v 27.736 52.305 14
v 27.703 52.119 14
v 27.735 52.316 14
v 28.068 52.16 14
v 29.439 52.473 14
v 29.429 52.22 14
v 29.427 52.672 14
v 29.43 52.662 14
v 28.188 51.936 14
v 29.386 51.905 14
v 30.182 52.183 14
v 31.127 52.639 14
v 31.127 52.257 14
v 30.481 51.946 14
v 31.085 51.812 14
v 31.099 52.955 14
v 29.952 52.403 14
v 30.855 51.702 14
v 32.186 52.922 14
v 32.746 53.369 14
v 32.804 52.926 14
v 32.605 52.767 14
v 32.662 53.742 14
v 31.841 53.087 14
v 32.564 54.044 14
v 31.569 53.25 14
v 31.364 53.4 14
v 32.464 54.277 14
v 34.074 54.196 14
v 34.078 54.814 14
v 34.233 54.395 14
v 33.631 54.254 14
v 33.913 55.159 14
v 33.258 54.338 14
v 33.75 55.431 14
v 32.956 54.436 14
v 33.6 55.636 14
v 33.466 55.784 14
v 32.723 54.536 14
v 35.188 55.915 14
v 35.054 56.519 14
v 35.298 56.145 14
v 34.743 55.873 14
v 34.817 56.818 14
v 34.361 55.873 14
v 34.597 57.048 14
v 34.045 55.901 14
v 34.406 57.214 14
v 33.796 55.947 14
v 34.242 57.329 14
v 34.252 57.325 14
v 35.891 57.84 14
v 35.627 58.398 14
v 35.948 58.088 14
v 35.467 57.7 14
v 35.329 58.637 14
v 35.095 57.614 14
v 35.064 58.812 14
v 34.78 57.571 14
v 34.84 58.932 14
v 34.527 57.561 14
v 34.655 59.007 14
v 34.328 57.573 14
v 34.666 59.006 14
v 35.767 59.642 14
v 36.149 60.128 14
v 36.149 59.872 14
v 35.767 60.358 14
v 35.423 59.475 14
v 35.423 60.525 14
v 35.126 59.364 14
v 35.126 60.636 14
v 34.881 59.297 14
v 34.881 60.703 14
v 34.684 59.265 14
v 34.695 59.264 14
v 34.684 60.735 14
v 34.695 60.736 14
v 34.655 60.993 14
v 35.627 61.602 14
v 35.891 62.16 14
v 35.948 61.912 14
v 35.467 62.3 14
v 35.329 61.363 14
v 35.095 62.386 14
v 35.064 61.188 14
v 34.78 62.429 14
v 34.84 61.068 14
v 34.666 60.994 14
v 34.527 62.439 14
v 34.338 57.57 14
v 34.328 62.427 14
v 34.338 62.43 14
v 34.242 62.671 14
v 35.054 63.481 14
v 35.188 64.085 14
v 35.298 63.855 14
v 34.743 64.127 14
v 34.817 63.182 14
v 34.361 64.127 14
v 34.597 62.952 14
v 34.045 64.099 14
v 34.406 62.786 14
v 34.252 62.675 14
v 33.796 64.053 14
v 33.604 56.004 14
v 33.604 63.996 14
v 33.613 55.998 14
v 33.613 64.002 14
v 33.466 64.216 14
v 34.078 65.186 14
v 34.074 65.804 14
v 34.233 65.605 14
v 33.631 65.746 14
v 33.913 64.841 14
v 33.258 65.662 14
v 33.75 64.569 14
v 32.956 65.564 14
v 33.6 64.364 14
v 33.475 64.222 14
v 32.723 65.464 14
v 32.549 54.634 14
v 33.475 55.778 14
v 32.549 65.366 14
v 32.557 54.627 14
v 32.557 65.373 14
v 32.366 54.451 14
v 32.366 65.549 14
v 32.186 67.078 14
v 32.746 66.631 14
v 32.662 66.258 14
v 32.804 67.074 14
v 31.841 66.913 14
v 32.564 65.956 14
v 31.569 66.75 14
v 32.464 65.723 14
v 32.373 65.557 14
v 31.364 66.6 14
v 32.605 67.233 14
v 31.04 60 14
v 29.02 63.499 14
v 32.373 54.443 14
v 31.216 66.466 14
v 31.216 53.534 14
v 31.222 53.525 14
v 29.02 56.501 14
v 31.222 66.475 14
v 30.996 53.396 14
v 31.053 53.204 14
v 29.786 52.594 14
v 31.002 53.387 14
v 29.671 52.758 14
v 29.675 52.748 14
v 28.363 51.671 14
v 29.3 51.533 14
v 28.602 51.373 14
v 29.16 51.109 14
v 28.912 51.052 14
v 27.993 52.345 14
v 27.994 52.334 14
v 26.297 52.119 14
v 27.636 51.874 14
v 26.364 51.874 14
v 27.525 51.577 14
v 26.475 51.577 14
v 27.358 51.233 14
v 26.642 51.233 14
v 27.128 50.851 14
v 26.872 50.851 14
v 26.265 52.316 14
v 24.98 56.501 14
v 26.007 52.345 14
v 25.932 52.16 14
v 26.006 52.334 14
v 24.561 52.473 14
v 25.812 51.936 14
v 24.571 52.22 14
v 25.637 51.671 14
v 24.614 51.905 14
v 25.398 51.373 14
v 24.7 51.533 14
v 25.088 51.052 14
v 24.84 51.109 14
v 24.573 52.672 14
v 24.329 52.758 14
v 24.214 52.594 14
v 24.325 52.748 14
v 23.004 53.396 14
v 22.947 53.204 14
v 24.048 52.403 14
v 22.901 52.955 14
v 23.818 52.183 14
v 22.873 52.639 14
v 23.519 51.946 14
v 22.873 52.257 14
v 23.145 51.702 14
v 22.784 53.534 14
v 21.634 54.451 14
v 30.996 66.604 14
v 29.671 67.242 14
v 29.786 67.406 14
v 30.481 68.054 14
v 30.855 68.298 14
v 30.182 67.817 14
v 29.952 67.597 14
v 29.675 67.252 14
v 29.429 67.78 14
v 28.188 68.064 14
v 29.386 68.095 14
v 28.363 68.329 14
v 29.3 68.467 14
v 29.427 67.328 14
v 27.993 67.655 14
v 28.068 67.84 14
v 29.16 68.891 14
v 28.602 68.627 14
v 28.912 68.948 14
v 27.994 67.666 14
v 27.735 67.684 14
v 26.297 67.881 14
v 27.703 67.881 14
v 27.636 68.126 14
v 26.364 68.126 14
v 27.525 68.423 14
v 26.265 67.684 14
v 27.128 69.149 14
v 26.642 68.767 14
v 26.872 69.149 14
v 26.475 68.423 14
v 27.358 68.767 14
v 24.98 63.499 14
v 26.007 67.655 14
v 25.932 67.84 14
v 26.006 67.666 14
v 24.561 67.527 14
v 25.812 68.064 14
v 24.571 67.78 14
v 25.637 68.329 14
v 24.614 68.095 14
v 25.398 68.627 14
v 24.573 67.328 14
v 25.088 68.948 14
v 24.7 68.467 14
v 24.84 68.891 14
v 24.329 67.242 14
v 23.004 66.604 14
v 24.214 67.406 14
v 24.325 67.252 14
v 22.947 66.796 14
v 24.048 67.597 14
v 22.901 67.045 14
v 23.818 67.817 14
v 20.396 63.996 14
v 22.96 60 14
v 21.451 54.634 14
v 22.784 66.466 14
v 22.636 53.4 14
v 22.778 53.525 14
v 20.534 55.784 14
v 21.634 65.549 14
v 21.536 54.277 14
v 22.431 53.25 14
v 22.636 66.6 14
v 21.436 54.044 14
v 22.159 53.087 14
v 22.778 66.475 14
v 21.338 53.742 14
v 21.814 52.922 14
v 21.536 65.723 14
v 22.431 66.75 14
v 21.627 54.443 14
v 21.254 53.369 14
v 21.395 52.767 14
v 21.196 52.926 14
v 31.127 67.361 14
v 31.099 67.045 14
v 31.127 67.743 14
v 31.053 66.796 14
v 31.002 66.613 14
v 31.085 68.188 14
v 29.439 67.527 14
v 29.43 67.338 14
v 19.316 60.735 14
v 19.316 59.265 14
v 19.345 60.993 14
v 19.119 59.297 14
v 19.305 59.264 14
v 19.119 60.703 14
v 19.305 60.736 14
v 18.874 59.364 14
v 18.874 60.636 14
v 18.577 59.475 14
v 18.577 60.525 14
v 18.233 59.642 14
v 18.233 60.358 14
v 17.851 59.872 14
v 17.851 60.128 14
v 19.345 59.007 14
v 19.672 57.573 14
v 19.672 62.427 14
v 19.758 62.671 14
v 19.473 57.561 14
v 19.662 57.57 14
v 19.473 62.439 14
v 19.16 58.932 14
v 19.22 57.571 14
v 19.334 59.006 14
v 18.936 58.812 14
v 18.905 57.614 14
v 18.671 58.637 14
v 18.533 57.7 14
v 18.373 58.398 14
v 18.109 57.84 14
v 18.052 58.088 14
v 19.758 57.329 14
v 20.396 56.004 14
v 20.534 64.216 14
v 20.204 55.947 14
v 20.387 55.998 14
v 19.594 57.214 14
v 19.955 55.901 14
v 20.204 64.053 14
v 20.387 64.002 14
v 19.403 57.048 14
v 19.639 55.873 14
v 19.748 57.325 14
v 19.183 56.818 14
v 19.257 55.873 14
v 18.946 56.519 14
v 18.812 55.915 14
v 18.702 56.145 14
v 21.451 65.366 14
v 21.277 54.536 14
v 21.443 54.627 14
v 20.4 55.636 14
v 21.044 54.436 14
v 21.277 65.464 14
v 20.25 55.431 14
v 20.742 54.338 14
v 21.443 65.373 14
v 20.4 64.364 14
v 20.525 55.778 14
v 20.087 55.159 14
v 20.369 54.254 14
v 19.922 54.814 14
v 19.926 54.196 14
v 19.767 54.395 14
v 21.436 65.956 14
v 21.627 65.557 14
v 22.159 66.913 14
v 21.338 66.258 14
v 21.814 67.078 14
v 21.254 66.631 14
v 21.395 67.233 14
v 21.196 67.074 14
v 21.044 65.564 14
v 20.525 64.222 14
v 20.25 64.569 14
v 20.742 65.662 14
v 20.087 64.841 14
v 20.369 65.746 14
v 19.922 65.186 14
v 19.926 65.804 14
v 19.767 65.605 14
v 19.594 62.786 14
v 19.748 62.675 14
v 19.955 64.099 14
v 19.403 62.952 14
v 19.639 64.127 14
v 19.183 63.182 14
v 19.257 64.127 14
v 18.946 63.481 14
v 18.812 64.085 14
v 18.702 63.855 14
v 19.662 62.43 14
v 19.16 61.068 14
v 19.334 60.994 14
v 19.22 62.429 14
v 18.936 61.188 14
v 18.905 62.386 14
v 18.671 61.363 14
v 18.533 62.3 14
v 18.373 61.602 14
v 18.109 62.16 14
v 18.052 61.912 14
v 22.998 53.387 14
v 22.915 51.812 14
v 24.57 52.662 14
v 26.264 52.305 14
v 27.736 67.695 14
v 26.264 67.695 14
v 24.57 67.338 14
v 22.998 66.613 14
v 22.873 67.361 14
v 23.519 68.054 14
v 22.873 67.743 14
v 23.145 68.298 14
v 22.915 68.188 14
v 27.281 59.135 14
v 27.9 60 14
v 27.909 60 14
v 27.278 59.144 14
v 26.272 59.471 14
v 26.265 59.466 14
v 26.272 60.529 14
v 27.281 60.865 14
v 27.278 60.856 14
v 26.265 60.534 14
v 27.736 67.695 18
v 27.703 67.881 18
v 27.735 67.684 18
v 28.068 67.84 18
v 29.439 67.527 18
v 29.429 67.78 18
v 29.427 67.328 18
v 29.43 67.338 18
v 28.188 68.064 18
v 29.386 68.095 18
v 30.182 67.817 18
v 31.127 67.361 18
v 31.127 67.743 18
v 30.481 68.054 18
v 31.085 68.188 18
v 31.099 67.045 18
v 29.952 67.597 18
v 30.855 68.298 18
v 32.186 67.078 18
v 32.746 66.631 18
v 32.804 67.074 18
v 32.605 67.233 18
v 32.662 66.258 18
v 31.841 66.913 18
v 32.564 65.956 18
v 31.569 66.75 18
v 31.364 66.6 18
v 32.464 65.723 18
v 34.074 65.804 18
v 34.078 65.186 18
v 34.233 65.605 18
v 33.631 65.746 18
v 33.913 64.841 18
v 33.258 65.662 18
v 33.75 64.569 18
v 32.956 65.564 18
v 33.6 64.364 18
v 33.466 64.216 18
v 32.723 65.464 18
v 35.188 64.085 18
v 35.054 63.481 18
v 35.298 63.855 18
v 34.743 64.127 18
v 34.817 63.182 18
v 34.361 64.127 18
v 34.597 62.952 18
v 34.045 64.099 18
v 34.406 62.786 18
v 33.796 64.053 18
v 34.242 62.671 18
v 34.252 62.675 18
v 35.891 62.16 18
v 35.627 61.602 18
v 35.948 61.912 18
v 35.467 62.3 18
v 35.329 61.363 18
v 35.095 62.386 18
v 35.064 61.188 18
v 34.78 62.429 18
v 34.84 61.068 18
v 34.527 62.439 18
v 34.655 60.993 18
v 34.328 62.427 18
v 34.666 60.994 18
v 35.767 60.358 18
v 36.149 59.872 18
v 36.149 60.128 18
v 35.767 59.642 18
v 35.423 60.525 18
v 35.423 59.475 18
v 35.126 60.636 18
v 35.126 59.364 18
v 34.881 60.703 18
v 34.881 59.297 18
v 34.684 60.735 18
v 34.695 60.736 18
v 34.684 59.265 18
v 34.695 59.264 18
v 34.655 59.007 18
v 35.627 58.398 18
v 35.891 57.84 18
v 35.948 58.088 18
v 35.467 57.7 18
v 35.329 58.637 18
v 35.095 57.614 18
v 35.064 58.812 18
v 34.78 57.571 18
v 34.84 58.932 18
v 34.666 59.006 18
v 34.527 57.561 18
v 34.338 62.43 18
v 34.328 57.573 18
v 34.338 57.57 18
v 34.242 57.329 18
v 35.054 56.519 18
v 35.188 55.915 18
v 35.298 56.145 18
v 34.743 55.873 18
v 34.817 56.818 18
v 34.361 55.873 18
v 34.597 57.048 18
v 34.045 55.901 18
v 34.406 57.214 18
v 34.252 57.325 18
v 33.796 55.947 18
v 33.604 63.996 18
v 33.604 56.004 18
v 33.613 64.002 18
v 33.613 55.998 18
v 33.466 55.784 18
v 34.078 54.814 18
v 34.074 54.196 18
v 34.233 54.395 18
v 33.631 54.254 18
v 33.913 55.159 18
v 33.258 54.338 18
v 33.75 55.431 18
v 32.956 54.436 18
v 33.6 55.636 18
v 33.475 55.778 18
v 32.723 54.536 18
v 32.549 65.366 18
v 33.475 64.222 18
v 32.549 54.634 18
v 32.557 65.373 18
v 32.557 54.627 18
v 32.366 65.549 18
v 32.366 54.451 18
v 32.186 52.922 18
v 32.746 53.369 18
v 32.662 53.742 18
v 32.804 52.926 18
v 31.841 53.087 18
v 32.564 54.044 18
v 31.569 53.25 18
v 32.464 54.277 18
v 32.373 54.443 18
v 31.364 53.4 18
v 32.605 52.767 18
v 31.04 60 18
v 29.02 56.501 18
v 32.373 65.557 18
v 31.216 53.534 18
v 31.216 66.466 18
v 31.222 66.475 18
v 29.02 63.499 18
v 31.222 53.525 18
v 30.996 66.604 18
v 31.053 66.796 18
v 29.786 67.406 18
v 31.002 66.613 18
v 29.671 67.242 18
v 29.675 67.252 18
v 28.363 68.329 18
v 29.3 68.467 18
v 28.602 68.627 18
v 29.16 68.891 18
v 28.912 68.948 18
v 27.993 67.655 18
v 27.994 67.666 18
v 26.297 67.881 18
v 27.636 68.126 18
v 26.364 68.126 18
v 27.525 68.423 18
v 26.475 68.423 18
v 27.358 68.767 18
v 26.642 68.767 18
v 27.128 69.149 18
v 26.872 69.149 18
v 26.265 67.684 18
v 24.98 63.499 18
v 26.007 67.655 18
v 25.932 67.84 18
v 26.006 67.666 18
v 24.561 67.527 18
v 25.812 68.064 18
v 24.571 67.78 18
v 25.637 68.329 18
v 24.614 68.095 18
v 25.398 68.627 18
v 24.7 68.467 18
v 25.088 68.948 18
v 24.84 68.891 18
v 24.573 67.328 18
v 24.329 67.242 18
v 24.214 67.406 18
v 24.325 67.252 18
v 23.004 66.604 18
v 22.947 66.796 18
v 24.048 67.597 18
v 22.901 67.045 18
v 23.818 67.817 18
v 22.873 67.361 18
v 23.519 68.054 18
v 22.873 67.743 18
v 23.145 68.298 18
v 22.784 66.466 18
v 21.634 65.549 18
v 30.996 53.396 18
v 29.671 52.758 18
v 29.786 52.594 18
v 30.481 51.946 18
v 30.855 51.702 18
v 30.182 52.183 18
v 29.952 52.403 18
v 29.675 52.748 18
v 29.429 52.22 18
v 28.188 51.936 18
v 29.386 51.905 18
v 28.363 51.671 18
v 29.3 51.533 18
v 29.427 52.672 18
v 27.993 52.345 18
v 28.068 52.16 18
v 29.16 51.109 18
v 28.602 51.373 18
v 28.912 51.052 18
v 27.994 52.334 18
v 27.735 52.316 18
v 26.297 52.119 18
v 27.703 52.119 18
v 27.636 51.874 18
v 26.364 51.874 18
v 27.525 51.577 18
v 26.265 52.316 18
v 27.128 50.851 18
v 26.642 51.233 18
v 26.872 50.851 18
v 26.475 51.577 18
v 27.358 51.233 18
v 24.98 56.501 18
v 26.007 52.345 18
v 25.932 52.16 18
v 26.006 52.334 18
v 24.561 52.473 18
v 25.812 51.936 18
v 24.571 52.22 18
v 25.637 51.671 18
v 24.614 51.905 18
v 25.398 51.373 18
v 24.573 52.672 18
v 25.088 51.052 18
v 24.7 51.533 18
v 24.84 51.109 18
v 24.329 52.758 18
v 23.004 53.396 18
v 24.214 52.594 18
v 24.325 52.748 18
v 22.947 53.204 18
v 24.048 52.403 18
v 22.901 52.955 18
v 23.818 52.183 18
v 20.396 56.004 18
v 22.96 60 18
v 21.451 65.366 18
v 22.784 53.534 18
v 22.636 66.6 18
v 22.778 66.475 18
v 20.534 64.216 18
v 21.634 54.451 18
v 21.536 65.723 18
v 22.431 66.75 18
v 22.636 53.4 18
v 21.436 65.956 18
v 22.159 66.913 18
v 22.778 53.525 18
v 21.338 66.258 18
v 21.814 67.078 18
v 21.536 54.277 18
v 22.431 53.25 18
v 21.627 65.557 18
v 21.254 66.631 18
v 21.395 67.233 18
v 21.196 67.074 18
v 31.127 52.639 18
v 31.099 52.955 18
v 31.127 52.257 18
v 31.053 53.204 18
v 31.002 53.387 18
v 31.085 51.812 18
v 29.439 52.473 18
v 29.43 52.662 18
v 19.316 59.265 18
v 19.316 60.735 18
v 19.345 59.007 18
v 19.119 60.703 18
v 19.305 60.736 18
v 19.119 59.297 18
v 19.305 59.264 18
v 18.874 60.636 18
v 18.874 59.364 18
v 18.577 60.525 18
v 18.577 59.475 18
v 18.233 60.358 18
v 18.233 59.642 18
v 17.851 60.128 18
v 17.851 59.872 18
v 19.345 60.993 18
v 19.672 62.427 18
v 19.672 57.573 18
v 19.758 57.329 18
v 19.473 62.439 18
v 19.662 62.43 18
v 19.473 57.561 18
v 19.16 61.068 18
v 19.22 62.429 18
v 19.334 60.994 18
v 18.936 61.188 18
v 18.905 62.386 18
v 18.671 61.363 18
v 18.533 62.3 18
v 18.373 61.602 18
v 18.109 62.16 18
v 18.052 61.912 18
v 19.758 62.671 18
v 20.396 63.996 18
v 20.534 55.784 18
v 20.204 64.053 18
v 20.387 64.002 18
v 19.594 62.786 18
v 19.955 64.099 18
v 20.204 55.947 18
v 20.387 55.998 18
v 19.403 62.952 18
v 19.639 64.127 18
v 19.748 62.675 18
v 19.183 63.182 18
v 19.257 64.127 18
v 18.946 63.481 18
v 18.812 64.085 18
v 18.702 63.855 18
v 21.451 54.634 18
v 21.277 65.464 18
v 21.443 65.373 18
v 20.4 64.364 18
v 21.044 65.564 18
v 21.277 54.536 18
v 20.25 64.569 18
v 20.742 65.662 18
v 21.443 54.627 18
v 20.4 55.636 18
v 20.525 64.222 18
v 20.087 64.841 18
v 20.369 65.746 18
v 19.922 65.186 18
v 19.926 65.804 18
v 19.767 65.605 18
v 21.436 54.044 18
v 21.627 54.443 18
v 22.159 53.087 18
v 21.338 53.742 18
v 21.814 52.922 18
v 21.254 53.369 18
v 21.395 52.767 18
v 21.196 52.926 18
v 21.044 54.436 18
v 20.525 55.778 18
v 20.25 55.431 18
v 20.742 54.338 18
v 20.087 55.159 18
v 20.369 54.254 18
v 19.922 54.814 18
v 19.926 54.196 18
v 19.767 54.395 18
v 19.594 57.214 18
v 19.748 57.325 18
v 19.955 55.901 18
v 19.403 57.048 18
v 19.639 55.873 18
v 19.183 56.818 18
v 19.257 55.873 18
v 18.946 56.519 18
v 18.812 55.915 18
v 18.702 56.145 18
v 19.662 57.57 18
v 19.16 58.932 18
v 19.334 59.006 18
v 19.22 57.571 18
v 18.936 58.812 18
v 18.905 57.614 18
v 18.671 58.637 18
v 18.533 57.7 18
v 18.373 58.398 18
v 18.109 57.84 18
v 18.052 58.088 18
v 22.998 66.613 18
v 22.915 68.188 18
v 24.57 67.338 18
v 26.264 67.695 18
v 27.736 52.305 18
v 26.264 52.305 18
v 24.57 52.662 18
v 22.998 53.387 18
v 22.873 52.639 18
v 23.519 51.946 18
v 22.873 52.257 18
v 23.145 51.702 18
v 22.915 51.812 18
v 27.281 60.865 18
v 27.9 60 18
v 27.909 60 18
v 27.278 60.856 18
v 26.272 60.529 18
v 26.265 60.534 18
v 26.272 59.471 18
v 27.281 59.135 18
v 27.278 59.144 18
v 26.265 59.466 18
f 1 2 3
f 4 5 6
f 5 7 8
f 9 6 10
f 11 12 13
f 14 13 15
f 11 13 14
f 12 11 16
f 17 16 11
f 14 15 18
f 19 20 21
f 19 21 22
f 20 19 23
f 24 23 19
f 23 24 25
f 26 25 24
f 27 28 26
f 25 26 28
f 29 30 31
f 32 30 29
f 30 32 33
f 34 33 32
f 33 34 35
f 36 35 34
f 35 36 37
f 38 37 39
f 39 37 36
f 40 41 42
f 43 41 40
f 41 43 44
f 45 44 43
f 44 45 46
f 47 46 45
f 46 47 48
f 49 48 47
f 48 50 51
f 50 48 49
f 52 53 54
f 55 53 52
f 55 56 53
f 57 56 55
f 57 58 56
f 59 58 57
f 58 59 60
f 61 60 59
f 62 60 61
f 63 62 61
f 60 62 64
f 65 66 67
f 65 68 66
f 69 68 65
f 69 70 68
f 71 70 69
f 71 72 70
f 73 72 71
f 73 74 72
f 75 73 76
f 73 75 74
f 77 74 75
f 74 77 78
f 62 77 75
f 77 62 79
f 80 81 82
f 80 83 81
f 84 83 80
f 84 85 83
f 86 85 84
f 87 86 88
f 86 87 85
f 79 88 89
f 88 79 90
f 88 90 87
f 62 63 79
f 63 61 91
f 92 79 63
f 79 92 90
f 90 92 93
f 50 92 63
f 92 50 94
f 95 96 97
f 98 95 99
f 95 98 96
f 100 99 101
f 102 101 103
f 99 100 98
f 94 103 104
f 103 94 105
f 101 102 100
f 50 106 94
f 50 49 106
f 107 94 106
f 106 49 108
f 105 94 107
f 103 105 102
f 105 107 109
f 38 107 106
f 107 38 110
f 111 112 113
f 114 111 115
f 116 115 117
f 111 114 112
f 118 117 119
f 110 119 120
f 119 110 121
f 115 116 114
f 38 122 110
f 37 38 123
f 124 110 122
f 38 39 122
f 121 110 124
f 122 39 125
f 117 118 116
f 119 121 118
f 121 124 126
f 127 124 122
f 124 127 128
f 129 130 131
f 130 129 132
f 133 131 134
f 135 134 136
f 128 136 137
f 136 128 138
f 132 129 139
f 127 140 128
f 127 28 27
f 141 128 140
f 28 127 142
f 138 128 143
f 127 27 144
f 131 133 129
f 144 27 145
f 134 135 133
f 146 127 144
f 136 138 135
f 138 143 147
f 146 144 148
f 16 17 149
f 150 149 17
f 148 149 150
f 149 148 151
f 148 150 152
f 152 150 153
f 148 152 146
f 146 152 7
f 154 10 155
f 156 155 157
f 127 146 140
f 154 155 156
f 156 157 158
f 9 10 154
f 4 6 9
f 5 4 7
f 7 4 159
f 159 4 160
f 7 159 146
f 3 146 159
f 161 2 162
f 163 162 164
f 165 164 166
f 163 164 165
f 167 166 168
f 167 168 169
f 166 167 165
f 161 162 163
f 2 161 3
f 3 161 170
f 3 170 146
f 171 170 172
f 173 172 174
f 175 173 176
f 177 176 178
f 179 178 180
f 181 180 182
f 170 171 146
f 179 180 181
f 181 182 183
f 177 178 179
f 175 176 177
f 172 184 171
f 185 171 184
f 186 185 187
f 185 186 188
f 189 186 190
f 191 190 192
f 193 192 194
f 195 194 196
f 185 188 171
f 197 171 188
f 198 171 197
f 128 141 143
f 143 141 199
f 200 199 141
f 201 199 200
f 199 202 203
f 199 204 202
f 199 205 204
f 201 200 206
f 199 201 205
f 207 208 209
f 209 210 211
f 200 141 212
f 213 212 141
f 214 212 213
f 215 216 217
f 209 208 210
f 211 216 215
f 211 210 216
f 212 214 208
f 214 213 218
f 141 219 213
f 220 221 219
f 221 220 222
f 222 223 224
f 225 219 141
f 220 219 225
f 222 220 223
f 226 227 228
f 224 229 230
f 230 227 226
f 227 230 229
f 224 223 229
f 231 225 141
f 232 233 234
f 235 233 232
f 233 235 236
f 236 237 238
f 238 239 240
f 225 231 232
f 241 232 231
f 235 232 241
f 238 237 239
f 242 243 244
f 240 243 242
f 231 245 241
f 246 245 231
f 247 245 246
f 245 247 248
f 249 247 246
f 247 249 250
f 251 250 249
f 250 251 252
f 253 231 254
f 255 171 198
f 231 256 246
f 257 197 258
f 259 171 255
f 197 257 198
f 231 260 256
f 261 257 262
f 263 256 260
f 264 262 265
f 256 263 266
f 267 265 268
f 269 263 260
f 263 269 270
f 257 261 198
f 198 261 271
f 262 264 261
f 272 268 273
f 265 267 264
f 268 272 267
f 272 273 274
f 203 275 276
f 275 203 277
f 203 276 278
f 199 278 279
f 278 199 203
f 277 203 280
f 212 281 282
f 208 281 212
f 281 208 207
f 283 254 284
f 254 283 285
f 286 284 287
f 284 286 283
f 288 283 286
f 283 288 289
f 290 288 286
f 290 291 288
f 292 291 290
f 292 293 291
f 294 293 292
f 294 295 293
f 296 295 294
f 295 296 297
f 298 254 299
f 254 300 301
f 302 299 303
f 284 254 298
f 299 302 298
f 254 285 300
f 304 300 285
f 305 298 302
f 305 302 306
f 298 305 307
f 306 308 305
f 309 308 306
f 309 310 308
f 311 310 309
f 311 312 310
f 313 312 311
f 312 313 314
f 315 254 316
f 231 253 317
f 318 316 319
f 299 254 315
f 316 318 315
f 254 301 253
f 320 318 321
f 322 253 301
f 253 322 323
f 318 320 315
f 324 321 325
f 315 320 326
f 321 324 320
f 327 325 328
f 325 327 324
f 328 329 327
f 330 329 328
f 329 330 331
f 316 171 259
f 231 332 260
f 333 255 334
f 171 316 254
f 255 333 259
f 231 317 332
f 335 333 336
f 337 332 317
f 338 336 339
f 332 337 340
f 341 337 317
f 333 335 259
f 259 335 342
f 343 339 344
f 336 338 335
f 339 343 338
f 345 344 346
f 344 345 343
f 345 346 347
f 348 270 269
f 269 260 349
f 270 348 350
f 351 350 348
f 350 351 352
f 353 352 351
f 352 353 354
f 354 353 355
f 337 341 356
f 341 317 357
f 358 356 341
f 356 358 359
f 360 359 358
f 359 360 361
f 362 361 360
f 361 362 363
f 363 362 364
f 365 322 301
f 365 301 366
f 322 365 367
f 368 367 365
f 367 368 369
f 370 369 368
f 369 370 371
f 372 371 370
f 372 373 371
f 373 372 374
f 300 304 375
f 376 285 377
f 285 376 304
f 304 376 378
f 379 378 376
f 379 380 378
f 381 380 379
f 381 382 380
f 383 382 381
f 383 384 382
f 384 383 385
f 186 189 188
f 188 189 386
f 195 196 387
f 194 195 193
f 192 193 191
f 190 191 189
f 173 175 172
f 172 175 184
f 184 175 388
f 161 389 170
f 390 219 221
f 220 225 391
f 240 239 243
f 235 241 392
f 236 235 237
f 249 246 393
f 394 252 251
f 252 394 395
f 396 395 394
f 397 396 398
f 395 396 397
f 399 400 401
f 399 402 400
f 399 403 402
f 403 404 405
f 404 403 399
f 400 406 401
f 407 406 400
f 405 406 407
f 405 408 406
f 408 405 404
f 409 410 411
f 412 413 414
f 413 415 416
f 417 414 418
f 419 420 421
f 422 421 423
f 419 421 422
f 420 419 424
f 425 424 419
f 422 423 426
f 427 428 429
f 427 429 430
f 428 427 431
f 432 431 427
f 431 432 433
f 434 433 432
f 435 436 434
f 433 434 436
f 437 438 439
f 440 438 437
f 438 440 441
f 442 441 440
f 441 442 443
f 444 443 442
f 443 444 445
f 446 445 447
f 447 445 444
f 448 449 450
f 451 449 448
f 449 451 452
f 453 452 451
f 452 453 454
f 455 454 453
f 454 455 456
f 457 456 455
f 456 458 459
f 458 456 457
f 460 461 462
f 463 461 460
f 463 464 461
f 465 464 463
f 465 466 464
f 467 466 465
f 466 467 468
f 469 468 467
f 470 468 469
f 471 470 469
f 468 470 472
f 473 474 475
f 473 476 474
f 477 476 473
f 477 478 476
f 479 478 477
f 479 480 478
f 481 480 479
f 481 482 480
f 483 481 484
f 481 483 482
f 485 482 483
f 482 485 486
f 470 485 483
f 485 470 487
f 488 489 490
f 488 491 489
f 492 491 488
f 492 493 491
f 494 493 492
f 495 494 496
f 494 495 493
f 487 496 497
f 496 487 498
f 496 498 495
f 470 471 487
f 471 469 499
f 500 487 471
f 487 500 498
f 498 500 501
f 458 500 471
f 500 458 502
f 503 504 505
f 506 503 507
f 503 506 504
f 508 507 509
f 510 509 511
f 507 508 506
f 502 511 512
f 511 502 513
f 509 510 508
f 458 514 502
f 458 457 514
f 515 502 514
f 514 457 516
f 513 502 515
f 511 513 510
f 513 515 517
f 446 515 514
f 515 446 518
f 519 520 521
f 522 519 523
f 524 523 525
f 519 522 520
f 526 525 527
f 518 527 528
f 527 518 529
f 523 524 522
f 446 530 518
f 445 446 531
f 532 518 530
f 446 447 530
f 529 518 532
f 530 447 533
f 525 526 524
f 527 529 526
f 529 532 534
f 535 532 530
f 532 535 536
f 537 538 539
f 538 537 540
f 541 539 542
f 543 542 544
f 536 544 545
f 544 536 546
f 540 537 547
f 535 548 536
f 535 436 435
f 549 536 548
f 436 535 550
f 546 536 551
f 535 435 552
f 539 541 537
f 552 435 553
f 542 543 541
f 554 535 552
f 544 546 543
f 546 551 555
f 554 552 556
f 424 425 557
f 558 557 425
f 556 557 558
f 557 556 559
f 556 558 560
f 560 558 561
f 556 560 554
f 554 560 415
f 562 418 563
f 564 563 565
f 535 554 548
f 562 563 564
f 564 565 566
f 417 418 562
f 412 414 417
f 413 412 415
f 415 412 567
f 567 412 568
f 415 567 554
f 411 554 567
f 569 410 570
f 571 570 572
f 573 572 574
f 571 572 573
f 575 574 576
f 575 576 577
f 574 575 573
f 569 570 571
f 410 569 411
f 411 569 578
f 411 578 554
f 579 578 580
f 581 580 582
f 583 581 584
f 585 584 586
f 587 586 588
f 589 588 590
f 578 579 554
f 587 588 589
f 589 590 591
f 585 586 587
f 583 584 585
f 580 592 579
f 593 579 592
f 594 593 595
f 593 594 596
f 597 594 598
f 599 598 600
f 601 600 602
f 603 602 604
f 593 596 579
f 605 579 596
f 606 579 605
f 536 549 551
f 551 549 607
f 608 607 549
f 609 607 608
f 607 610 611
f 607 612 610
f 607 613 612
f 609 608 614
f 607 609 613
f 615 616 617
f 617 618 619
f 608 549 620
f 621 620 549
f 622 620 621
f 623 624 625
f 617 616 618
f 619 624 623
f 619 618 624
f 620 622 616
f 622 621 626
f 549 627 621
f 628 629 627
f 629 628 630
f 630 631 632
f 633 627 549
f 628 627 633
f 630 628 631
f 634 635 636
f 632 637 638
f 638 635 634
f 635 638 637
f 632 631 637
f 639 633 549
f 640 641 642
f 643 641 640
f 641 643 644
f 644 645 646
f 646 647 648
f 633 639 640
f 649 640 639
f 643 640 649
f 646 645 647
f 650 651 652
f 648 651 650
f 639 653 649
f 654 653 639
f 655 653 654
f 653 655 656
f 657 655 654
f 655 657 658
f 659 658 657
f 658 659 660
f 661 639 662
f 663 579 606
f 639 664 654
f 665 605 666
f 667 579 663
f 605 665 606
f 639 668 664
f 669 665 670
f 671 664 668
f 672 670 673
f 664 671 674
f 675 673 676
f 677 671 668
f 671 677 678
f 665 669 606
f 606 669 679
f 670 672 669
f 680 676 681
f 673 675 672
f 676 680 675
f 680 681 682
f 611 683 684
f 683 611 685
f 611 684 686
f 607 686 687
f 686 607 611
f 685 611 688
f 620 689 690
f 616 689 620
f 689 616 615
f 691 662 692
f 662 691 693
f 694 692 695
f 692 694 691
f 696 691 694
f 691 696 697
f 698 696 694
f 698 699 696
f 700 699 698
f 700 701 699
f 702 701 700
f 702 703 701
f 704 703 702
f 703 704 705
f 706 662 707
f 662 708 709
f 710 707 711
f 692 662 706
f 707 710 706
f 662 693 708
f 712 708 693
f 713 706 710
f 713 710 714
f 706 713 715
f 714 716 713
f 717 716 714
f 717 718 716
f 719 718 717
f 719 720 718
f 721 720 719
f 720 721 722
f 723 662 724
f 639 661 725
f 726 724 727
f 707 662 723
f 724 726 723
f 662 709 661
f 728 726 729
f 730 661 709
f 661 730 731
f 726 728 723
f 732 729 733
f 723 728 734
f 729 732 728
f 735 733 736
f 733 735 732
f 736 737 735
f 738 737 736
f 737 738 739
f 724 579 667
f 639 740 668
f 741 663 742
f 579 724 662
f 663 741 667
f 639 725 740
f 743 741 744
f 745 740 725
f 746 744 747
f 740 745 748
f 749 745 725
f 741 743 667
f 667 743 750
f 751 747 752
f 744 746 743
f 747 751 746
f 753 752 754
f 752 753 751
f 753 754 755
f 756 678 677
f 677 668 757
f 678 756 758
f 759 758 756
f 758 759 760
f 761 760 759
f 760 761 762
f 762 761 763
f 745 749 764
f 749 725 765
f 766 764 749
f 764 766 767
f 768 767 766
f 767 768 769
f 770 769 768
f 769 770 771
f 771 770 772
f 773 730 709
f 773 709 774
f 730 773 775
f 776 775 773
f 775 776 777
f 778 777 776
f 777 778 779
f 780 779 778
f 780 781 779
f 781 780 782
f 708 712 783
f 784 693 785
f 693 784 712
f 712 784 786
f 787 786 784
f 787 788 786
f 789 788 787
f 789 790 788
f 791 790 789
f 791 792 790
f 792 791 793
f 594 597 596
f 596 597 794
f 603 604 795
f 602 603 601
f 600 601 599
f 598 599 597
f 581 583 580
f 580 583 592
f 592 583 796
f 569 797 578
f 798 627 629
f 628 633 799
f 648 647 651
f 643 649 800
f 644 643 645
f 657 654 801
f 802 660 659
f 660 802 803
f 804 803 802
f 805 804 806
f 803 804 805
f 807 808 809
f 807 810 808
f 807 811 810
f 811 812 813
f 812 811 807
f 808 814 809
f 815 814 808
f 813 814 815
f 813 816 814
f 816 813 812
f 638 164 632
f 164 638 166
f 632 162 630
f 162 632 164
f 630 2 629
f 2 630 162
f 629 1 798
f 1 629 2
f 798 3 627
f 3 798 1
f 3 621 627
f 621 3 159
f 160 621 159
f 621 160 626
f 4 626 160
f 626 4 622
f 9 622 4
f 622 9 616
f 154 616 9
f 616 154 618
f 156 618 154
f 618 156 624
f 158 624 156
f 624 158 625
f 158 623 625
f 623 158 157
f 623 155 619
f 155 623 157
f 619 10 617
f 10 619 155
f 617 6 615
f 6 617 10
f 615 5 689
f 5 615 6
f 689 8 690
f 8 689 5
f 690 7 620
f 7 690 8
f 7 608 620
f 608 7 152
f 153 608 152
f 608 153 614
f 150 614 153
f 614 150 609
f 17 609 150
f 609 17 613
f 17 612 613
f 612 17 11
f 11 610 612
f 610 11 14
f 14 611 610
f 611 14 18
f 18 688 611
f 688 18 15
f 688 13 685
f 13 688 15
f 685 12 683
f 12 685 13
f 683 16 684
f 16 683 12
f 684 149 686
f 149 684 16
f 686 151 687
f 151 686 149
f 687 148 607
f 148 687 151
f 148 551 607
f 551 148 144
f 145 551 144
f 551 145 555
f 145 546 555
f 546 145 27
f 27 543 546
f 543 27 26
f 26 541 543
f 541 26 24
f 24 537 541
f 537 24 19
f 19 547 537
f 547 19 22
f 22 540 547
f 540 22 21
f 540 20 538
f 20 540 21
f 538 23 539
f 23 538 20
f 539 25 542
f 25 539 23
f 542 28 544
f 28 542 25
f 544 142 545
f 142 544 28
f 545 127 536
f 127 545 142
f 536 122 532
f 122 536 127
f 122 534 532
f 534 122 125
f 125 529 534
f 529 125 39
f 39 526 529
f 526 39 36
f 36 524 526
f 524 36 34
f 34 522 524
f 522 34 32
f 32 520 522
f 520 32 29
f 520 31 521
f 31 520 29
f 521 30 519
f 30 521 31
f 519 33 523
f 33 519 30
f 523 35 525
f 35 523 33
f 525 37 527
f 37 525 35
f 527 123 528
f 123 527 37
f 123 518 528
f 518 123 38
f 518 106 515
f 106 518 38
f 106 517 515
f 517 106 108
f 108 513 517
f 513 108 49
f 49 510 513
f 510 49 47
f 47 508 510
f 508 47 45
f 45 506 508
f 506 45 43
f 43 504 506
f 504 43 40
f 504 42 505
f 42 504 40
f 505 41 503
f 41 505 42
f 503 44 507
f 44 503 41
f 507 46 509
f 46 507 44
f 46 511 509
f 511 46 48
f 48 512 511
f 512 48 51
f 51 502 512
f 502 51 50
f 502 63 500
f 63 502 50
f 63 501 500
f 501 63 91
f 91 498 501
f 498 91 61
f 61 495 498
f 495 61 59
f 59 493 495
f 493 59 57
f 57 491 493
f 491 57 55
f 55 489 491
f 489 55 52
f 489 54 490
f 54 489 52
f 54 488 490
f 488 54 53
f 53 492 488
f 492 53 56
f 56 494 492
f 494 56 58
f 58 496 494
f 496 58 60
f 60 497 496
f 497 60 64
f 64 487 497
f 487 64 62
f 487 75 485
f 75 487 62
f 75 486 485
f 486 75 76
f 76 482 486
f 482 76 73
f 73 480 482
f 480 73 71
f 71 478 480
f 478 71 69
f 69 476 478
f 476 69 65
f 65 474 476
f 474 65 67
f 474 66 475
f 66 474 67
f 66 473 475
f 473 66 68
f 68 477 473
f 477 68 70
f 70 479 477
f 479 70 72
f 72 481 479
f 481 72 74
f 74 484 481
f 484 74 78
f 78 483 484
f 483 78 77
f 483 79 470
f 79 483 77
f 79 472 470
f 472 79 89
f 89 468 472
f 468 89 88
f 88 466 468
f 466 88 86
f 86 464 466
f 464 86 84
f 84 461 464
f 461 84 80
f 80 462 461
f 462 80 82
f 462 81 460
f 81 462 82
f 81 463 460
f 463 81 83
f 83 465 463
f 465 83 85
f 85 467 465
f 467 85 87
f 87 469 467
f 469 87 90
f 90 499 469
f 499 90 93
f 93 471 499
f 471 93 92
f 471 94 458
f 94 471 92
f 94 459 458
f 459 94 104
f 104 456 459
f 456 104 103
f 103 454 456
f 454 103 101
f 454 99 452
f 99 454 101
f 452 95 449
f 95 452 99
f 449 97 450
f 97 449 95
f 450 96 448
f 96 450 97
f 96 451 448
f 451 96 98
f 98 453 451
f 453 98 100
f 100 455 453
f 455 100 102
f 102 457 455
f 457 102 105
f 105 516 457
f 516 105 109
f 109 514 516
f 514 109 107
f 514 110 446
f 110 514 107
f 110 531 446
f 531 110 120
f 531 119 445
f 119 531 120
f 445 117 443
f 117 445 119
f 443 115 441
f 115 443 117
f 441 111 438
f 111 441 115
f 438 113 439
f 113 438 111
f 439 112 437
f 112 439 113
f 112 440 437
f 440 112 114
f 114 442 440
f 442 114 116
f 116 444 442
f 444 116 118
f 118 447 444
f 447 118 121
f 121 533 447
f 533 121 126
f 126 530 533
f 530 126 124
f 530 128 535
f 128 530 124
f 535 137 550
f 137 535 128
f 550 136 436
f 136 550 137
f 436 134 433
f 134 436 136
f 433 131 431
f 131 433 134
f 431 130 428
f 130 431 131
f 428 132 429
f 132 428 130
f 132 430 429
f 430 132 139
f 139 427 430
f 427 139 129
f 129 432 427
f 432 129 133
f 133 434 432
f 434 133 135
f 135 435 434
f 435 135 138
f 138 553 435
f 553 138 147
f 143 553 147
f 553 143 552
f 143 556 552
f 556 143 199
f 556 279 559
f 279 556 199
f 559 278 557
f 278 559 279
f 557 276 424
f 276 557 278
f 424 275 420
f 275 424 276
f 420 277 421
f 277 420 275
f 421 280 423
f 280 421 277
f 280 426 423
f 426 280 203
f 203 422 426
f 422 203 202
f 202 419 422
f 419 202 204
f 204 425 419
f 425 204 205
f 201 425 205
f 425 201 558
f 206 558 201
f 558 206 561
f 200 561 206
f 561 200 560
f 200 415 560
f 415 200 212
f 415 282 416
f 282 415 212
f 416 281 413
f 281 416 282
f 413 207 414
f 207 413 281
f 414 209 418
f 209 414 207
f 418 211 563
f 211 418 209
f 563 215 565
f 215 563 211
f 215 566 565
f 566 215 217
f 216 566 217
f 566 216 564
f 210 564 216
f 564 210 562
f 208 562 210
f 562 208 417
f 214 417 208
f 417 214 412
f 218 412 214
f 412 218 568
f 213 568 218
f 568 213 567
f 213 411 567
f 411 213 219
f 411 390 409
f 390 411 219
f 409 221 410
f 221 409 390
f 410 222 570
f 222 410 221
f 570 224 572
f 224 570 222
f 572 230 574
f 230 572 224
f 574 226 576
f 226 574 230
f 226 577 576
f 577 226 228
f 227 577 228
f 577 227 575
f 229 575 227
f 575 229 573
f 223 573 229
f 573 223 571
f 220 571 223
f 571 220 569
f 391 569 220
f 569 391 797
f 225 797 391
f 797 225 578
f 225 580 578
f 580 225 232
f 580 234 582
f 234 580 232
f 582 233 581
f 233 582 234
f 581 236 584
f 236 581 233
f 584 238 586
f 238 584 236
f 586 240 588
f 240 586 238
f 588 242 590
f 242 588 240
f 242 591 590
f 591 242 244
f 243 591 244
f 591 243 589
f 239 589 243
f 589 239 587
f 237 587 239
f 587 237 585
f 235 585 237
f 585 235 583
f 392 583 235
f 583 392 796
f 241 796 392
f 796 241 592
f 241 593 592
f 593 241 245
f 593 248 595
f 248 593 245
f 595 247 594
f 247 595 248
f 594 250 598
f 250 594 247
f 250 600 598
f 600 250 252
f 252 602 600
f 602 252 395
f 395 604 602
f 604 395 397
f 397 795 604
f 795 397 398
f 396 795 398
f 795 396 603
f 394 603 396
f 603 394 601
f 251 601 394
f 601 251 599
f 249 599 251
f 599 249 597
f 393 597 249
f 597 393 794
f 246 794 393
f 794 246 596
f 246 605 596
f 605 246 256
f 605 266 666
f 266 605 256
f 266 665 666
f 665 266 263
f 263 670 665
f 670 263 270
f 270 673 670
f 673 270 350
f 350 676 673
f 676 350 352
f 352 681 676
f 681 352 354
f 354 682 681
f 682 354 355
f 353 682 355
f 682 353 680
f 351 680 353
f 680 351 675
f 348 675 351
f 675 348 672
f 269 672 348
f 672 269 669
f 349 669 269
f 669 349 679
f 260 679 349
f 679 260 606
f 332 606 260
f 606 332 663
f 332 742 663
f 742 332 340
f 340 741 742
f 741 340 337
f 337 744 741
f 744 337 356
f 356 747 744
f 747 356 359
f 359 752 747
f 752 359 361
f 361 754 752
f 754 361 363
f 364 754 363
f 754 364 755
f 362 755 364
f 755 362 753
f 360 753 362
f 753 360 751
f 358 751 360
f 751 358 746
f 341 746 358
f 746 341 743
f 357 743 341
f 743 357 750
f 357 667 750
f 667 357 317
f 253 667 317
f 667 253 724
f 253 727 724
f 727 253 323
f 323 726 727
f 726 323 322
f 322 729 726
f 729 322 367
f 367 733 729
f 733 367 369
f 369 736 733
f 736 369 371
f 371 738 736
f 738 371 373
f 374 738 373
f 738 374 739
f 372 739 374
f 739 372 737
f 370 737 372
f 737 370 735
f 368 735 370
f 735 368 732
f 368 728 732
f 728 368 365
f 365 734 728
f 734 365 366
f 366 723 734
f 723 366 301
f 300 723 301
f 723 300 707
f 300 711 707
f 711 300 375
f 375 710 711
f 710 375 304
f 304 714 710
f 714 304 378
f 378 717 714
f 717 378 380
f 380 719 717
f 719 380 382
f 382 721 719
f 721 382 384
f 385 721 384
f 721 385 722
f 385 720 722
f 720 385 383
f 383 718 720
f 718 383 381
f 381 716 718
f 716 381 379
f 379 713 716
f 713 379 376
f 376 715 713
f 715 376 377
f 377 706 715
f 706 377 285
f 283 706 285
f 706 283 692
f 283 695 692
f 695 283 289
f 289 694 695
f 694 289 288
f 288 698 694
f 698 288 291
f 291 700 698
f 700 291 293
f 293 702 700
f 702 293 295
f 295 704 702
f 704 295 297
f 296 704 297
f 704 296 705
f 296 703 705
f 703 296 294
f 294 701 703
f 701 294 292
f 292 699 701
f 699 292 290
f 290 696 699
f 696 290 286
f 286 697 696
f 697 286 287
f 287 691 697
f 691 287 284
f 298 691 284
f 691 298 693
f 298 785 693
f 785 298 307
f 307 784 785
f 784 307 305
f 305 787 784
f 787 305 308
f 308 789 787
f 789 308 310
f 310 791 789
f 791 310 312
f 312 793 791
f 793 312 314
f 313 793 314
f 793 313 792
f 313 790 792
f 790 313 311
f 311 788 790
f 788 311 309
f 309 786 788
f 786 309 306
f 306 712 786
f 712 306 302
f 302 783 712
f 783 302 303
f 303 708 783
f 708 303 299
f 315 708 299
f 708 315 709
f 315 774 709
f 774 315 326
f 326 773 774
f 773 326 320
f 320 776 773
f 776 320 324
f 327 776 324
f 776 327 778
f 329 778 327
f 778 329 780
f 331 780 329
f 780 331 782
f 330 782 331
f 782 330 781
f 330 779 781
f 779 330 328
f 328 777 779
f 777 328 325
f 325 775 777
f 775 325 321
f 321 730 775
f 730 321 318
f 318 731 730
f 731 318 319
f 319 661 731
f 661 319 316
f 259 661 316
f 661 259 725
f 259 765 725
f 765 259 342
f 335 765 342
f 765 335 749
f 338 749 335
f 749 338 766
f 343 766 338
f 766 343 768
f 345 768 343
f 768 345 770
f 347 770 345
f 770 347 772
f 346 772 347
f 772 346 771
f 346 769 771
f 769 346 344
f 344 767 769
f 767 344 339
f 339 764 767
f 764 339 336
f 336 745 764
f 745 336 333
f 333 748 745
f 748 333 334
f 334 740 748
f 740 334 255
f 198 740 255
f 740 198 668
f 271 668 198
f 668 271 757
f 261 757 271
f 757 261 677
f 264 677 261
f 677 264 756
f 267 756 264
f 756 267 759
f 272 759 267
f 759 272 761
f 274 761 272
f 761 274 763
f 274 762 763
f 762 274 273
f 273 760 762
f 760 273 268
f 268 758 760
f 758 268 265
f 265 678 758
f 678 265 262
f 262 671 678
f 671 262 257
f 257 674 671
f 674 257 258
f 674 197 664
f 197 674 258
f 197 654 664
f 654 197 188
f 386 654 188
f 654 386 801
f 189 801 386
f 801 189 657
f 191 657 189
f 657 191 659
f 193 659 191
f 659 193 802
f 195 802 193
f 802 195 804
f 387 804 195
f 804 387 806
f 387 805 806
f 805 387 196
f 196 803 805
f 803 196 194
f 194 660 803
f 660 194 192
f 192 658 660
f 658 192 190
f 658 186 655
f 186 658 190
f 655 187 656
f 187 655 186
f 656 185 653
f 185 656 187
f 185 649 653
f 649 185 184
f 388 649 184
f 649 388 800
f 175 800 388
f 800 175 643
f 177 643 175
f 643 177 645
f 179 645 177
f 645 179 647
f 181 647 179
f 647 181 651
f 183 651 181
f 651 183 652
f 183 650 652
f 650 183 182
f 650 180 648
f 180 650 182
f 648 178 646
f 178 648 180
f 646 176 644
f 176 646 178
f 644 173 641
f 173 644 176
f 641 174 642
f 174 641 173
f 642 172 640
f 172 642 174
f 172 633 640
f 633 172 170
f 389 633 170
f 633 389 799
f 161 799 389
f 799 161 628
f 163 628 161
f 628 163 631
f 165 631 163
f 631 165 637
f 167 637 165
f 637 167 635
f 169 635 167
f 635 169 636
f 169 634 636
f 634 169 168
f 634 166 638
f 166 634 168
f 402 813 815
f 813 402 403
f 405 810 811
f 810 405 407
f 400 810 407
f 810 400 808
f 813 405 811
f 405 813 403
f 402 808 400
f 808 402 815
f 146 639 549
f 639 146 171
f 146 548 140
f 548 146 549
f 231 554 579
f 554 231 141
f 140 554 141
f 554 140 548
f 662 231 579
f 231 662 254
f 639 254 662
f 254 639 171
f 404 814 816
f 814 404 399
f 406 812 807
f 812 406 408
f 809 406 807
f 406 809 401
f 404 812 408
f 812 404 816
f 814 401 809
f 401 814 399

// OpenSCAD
// file: ModuleKatzenklappe.scad
// //////////////////////////////////
// Module für Katzenklappenverschluss
// //////////////////////////////////

module armHorn (laenge, breite, dicke) {
    difference() {
    union() {
    translate ([0,-breite/2,0])
    cube([laenge,breite,dicke], false);
    translate ([laenge,0,0])
    cylinder(dicke,r=breite/2, false); 
    }
    translate ([laenge*1.0,0,0])
    loch(radius=2,tiefe= dicke + 1);
/*    translate ([laenge*0.6,0,dicke-1])
    letter("Achim");
    translate ([laenge*0.6,0,1])
    rotate([0,180,0])
    letter("Tim");
    translate ([laenge*0.2,0,0])
    loch(radius=2,tiefe= dicke + 1);
*/    }
};

module mittelRad (breite) {
    difference() {
        cylinder(breite,r=12.5, false);
        cylinder(breite,r=2.0, false);
        
/*        translate([0,0,breite])
        gear (
            toothNo = 100, 
            toothWidth = 1, 
            toothHeight  = 2, 
            thickness = breite,
            holeRadius = 5,
            holeSides = 6
        );
        translate ([-25,0,0])
        loch(radius=5,tiefe=breite + 1);
        translate ([25,0,0])
        loch(radius=5,tiefe=breite + 1);
        translate ([0,-25,0])
        loch(radius=5,tiefe=breite + 1);
        translate ([0,25,0])
        loch(radius=5,tiefe=breite + 1);
*/        } 
};

module loch (radius, tiefe) {
        cylinder(tiefe,r=radius, false);   
};

module zapfen (breite,tiefe) {
        cube([breite,breite,tiefe], true);   
};

module wand (breite) {
    difference() {
        cube([breite,120,5], false);  
        translate ([5,5,0])
        cube([breite/3-10,110,5], false);  
        translate ([breite/3+5,5,0])
        cube([breite/3-10,110,5], false);  
        translate ([2*breite/3+5,5,0])
        cube([breite/3-10,110,5], false);  
    } 
};

module lArm(laenge, breite, dicke) {
    difference() {
        union() {
            armHorn(laenge=laenge, breite=breite, dicke=dicke);
            rotate(90) armHorn(laenge=laenge, breite=breite, dicke=dicke);
            cylinder(dicke,r=breite/2, false); 
           }
            translate ([0,0,0])
            zapfen(breite= 3, tiefe = dicke * 2);
        }
};

module mittelAchse(laenge, radius_achse, zapfen_breite, zapfen_laenge, breite) {
    difference() {
        union() {
            translate ([0,0,zapfen_laenge /2])
            zapfen(breite= zapfen_breite, tiefe=zapfen_laenge);   
            translate ([0,0,zapfen_laenge])
            cylinder(laenge,r = radius_achse, false, $fn=6);
            translate ([0,0,laenge+(1.5*zapfen_laenge)])
            zapfen(breite= zapfen_breite, tiefe=zapfen_laenge);   
        }
        cylinder (laenge+6,r=0.9, false);
    }
};

module achse(laenge, radius_achse) {
    difference() {
        cylinder(laenge,r = radius_achse, false, $fn=6);
        cylinder (laenge+6,r=0.9, false);
    }
};


module tooth(width, thickness, height){
  scale([width/5,thickness/5,height/10]){
    difference(){
      translate([-2.5,0,0])
      cube([5,5,10]);
      translate([5+1.25-2.5,0-1,0])
      rotate([0,-14.0362434,0])
        cube([5,5+2,12]);
      translate([0-1.25-2.5,0+5+1,0])
      rotate([0,-14.0362434,180])
        cube([5,5+2,12]);
    }
  }
}
module gear(toothNo, toothWidth, toothHeight, thickness,holeRadius,holeSides){
  radius = (toothWidth*1.7*toothNo)/3.141592653589793238/2;
  rotate([-90,0,0])
  difference(){
    union(){
      for(i=[0:toothNo]){
        rotate([0,(360/toothNo)*i,0])
        translate([0,0,radius-0.5])
          tooth(toothWidth,thickness,toothHeight);
      }
      translate([0,thickness,0])
      rotate([90,0,0])
        cylinder(r=radius, h=thickness);
    }
  translate([0,thickness+1,0])
  rotate([90,0,0])
    cylinder(r=holeRadius,h=thickness+2,$fn=holeSides);
  }
}

font = "Liberation Sans";


letter_size = 5;
letter_height = 3;


module letter(l) {
  // Use linear_extrude() to make the letters 3D objects as they
  // are only 2D shapes when only using text()
  linear_extrude(height = letter_height) {
    text(l, size = letter_size, font = font, halign = "center", valign = "center", $fn = 16);
  }
}


module 9g_motor(){
	difference(){			
		union(){
			color("SteelBlue") cube([23,12.5,22], center=true);
			color("SteelBlue") translate([0,0,5]) cube([32,12,2], center=true);
			color("SteelBlue") translate([5.5,0,2.75]) cylinder(r=6, h=25.75, $fn=20, center=true);
			color("SteelBlue") translate([-.5,0,2.75]) cylinder(r=1, h=25.75, $fn=20, center=true);
			color("SteelBlue") translate([-1,0,2.75]) cube([5,5.6,24.5], center=true);		
			color("white") translate([5.5,0,3.65]) cylinder(r=2.35, h=29.25, $fn=20, center=true);				
		}
		translate([10,0,-11]) rotate([0,-30,0]) cube([8,13,4], center=true);
		for ( hole = [14,-14] ){
			translate([hole,0,5]) cylinder(r=2.2, h=4, $fn=20, center=true);
		}	
	}
}

module sg90() {
	color("blue") difference() {
		union() {
			translate([0,0,22.5/2]) cube([22.5,12.2,22.5], center=true);
			translate([0,0,16.75]) cube([32.2,12.2,2], center=true);

			translate([0,0,22.5-1]) {
				hull() {
					translate([-1,0,0]) cylinder(d=5.5, h=4+1);
					translate([1,0,0]) cylinder(d=5.5, h=4+1);
				}

				translate([5.5,0,0]) cylinder(d=11.6, h=4+1);
			}

		}	

		translate([-32.5/2+2,0,16.75-2]) {
			cylinder(d=2, h=2+2);
			translate([-2,0,2]) cube([4,1,2+2], center=true);
		}
		translate([32.5/2-2,0,16.75-2]) {
			cylinder(d=2, h=2+2);
			translate([2,0,2]) cube([4,1,2+2], center=true);
		}
	}
	color("white") translate([5.5,0,22.5-1+4]) {
		difference() {
			cylinder(d=4.8, h=3+1);
			translate([0,0,1]) cylinder(d=2, h=4);
		}
	}
}

module stuetze (hoehe) {
    difference() {
        translate ([0,0,0])
        cube([hoehe,20,3], false);
        translate ([hoehe*0.8,10,0])
        cylinder(21,r=1.5, center=true);
        translate ([hoehe*0.7,10,0])
        cylinder(21,r=1.5, center=true);
        translate ([hoehe*0.6,10,0])
        cylinder(21,r=1.5, center=true);
        translate ([hoehe*0.5,10,0])
        cylinder(21,r=1.5, center=true);
    }
}

module balken (laenge) {
    difference() {
        translate ([0,-10,0])
        cube([5,laenge,3], false);
    }
/*    translate ([2.5,25,2.5])
        rotate(-90,90,0)
        letter("Design by Achim & Tim 2018");    
*/
}

module boden(laenge, breite) {
    difference() {
        cube([5,laenge,breite], false);
        rotate([0,90,0])
        translate ([-breite/2,laenge*0.1,0])
        cylinder(6,r=1.5, center=false);
        rotate([0,90,0])
        translate ([-breite/2,laenge*0.5,0])
        cylinder(6,r=1.5, center=false);
        rotate([0,90,0])
        translate ([-breite/2,laenge*0.9,0])
        cylinder(6,r=1.5, center=false);
    }
}

module wand(hoehe, anzahl, abstand) {
    for (a =[0:abstand:anzahl*abstand])
        translate ([0,a,0])
        stuetze(hoehe);
    translate ([0,10,0])
    balken(anzahl*abstand);
    translate ([hoehe-5,10,0])
    balken(anzahl*abstand);
}

module halterung(hoehe) {
    // Bodenplatte
    cube([5,22,36],false);
    difference(){
        // Motorhalterung
        cube([hoehe,22,15.5],false);
        translate ([hoehe-5,10,11])
        cylinder(6,r=0.5, center=false);
        translate ([10,10,11])
        cylinder(6,r=0.5, center=false);
    }
}
// main file
include <ModuleKatzenklappe.scad>;
include <gears.scad>;

zahnradabstand = 25;
gehaeusehoehe = 45;

// Maße eines L-Arms
lArmBreite  = 10;
lArmLaenge  = 18;
lArmDicke   = 3;

// Maße der Mittelachse
mittelAchseLaenge       = 21;
mittelAchseRadius       = 4;
mittelAchseZapfenBreite = 2.5;
mittelAchseZapfenLaenge = 3;
mittelAchseRadBreite    = 5;

// Zahnrad 1.1
/*translate ([gehaeusehoehe*0.6,60,28])
gear (number_of_teeth=26,
			circular_pitch=109.8,
            hub_diameter=7,
            bore_diameter=1.8,
			rim_width=2,
			rim_thickness=4,
			gear_thickness=4,
			hub_thickness=4,
			circles=0);*/

// Zahnrad 1.2
difference(){
translate ([gehaeusehoehe*0.6,60,14])
gear (number_of_teeth=28,
			circular_pitch=109.8,
            hub_diameter=7,
            bore_diameter=1.8,
			rim_width=2,
			rim_thickness=4,
			gear_thickness=4,
			hub_thickness=4,
			circles=0);

translate ([gehaeusehoehe*0.6,60,4])
scale(1.01)
achse(laenge=25, radius_achse=mittelAchseRadius);}
